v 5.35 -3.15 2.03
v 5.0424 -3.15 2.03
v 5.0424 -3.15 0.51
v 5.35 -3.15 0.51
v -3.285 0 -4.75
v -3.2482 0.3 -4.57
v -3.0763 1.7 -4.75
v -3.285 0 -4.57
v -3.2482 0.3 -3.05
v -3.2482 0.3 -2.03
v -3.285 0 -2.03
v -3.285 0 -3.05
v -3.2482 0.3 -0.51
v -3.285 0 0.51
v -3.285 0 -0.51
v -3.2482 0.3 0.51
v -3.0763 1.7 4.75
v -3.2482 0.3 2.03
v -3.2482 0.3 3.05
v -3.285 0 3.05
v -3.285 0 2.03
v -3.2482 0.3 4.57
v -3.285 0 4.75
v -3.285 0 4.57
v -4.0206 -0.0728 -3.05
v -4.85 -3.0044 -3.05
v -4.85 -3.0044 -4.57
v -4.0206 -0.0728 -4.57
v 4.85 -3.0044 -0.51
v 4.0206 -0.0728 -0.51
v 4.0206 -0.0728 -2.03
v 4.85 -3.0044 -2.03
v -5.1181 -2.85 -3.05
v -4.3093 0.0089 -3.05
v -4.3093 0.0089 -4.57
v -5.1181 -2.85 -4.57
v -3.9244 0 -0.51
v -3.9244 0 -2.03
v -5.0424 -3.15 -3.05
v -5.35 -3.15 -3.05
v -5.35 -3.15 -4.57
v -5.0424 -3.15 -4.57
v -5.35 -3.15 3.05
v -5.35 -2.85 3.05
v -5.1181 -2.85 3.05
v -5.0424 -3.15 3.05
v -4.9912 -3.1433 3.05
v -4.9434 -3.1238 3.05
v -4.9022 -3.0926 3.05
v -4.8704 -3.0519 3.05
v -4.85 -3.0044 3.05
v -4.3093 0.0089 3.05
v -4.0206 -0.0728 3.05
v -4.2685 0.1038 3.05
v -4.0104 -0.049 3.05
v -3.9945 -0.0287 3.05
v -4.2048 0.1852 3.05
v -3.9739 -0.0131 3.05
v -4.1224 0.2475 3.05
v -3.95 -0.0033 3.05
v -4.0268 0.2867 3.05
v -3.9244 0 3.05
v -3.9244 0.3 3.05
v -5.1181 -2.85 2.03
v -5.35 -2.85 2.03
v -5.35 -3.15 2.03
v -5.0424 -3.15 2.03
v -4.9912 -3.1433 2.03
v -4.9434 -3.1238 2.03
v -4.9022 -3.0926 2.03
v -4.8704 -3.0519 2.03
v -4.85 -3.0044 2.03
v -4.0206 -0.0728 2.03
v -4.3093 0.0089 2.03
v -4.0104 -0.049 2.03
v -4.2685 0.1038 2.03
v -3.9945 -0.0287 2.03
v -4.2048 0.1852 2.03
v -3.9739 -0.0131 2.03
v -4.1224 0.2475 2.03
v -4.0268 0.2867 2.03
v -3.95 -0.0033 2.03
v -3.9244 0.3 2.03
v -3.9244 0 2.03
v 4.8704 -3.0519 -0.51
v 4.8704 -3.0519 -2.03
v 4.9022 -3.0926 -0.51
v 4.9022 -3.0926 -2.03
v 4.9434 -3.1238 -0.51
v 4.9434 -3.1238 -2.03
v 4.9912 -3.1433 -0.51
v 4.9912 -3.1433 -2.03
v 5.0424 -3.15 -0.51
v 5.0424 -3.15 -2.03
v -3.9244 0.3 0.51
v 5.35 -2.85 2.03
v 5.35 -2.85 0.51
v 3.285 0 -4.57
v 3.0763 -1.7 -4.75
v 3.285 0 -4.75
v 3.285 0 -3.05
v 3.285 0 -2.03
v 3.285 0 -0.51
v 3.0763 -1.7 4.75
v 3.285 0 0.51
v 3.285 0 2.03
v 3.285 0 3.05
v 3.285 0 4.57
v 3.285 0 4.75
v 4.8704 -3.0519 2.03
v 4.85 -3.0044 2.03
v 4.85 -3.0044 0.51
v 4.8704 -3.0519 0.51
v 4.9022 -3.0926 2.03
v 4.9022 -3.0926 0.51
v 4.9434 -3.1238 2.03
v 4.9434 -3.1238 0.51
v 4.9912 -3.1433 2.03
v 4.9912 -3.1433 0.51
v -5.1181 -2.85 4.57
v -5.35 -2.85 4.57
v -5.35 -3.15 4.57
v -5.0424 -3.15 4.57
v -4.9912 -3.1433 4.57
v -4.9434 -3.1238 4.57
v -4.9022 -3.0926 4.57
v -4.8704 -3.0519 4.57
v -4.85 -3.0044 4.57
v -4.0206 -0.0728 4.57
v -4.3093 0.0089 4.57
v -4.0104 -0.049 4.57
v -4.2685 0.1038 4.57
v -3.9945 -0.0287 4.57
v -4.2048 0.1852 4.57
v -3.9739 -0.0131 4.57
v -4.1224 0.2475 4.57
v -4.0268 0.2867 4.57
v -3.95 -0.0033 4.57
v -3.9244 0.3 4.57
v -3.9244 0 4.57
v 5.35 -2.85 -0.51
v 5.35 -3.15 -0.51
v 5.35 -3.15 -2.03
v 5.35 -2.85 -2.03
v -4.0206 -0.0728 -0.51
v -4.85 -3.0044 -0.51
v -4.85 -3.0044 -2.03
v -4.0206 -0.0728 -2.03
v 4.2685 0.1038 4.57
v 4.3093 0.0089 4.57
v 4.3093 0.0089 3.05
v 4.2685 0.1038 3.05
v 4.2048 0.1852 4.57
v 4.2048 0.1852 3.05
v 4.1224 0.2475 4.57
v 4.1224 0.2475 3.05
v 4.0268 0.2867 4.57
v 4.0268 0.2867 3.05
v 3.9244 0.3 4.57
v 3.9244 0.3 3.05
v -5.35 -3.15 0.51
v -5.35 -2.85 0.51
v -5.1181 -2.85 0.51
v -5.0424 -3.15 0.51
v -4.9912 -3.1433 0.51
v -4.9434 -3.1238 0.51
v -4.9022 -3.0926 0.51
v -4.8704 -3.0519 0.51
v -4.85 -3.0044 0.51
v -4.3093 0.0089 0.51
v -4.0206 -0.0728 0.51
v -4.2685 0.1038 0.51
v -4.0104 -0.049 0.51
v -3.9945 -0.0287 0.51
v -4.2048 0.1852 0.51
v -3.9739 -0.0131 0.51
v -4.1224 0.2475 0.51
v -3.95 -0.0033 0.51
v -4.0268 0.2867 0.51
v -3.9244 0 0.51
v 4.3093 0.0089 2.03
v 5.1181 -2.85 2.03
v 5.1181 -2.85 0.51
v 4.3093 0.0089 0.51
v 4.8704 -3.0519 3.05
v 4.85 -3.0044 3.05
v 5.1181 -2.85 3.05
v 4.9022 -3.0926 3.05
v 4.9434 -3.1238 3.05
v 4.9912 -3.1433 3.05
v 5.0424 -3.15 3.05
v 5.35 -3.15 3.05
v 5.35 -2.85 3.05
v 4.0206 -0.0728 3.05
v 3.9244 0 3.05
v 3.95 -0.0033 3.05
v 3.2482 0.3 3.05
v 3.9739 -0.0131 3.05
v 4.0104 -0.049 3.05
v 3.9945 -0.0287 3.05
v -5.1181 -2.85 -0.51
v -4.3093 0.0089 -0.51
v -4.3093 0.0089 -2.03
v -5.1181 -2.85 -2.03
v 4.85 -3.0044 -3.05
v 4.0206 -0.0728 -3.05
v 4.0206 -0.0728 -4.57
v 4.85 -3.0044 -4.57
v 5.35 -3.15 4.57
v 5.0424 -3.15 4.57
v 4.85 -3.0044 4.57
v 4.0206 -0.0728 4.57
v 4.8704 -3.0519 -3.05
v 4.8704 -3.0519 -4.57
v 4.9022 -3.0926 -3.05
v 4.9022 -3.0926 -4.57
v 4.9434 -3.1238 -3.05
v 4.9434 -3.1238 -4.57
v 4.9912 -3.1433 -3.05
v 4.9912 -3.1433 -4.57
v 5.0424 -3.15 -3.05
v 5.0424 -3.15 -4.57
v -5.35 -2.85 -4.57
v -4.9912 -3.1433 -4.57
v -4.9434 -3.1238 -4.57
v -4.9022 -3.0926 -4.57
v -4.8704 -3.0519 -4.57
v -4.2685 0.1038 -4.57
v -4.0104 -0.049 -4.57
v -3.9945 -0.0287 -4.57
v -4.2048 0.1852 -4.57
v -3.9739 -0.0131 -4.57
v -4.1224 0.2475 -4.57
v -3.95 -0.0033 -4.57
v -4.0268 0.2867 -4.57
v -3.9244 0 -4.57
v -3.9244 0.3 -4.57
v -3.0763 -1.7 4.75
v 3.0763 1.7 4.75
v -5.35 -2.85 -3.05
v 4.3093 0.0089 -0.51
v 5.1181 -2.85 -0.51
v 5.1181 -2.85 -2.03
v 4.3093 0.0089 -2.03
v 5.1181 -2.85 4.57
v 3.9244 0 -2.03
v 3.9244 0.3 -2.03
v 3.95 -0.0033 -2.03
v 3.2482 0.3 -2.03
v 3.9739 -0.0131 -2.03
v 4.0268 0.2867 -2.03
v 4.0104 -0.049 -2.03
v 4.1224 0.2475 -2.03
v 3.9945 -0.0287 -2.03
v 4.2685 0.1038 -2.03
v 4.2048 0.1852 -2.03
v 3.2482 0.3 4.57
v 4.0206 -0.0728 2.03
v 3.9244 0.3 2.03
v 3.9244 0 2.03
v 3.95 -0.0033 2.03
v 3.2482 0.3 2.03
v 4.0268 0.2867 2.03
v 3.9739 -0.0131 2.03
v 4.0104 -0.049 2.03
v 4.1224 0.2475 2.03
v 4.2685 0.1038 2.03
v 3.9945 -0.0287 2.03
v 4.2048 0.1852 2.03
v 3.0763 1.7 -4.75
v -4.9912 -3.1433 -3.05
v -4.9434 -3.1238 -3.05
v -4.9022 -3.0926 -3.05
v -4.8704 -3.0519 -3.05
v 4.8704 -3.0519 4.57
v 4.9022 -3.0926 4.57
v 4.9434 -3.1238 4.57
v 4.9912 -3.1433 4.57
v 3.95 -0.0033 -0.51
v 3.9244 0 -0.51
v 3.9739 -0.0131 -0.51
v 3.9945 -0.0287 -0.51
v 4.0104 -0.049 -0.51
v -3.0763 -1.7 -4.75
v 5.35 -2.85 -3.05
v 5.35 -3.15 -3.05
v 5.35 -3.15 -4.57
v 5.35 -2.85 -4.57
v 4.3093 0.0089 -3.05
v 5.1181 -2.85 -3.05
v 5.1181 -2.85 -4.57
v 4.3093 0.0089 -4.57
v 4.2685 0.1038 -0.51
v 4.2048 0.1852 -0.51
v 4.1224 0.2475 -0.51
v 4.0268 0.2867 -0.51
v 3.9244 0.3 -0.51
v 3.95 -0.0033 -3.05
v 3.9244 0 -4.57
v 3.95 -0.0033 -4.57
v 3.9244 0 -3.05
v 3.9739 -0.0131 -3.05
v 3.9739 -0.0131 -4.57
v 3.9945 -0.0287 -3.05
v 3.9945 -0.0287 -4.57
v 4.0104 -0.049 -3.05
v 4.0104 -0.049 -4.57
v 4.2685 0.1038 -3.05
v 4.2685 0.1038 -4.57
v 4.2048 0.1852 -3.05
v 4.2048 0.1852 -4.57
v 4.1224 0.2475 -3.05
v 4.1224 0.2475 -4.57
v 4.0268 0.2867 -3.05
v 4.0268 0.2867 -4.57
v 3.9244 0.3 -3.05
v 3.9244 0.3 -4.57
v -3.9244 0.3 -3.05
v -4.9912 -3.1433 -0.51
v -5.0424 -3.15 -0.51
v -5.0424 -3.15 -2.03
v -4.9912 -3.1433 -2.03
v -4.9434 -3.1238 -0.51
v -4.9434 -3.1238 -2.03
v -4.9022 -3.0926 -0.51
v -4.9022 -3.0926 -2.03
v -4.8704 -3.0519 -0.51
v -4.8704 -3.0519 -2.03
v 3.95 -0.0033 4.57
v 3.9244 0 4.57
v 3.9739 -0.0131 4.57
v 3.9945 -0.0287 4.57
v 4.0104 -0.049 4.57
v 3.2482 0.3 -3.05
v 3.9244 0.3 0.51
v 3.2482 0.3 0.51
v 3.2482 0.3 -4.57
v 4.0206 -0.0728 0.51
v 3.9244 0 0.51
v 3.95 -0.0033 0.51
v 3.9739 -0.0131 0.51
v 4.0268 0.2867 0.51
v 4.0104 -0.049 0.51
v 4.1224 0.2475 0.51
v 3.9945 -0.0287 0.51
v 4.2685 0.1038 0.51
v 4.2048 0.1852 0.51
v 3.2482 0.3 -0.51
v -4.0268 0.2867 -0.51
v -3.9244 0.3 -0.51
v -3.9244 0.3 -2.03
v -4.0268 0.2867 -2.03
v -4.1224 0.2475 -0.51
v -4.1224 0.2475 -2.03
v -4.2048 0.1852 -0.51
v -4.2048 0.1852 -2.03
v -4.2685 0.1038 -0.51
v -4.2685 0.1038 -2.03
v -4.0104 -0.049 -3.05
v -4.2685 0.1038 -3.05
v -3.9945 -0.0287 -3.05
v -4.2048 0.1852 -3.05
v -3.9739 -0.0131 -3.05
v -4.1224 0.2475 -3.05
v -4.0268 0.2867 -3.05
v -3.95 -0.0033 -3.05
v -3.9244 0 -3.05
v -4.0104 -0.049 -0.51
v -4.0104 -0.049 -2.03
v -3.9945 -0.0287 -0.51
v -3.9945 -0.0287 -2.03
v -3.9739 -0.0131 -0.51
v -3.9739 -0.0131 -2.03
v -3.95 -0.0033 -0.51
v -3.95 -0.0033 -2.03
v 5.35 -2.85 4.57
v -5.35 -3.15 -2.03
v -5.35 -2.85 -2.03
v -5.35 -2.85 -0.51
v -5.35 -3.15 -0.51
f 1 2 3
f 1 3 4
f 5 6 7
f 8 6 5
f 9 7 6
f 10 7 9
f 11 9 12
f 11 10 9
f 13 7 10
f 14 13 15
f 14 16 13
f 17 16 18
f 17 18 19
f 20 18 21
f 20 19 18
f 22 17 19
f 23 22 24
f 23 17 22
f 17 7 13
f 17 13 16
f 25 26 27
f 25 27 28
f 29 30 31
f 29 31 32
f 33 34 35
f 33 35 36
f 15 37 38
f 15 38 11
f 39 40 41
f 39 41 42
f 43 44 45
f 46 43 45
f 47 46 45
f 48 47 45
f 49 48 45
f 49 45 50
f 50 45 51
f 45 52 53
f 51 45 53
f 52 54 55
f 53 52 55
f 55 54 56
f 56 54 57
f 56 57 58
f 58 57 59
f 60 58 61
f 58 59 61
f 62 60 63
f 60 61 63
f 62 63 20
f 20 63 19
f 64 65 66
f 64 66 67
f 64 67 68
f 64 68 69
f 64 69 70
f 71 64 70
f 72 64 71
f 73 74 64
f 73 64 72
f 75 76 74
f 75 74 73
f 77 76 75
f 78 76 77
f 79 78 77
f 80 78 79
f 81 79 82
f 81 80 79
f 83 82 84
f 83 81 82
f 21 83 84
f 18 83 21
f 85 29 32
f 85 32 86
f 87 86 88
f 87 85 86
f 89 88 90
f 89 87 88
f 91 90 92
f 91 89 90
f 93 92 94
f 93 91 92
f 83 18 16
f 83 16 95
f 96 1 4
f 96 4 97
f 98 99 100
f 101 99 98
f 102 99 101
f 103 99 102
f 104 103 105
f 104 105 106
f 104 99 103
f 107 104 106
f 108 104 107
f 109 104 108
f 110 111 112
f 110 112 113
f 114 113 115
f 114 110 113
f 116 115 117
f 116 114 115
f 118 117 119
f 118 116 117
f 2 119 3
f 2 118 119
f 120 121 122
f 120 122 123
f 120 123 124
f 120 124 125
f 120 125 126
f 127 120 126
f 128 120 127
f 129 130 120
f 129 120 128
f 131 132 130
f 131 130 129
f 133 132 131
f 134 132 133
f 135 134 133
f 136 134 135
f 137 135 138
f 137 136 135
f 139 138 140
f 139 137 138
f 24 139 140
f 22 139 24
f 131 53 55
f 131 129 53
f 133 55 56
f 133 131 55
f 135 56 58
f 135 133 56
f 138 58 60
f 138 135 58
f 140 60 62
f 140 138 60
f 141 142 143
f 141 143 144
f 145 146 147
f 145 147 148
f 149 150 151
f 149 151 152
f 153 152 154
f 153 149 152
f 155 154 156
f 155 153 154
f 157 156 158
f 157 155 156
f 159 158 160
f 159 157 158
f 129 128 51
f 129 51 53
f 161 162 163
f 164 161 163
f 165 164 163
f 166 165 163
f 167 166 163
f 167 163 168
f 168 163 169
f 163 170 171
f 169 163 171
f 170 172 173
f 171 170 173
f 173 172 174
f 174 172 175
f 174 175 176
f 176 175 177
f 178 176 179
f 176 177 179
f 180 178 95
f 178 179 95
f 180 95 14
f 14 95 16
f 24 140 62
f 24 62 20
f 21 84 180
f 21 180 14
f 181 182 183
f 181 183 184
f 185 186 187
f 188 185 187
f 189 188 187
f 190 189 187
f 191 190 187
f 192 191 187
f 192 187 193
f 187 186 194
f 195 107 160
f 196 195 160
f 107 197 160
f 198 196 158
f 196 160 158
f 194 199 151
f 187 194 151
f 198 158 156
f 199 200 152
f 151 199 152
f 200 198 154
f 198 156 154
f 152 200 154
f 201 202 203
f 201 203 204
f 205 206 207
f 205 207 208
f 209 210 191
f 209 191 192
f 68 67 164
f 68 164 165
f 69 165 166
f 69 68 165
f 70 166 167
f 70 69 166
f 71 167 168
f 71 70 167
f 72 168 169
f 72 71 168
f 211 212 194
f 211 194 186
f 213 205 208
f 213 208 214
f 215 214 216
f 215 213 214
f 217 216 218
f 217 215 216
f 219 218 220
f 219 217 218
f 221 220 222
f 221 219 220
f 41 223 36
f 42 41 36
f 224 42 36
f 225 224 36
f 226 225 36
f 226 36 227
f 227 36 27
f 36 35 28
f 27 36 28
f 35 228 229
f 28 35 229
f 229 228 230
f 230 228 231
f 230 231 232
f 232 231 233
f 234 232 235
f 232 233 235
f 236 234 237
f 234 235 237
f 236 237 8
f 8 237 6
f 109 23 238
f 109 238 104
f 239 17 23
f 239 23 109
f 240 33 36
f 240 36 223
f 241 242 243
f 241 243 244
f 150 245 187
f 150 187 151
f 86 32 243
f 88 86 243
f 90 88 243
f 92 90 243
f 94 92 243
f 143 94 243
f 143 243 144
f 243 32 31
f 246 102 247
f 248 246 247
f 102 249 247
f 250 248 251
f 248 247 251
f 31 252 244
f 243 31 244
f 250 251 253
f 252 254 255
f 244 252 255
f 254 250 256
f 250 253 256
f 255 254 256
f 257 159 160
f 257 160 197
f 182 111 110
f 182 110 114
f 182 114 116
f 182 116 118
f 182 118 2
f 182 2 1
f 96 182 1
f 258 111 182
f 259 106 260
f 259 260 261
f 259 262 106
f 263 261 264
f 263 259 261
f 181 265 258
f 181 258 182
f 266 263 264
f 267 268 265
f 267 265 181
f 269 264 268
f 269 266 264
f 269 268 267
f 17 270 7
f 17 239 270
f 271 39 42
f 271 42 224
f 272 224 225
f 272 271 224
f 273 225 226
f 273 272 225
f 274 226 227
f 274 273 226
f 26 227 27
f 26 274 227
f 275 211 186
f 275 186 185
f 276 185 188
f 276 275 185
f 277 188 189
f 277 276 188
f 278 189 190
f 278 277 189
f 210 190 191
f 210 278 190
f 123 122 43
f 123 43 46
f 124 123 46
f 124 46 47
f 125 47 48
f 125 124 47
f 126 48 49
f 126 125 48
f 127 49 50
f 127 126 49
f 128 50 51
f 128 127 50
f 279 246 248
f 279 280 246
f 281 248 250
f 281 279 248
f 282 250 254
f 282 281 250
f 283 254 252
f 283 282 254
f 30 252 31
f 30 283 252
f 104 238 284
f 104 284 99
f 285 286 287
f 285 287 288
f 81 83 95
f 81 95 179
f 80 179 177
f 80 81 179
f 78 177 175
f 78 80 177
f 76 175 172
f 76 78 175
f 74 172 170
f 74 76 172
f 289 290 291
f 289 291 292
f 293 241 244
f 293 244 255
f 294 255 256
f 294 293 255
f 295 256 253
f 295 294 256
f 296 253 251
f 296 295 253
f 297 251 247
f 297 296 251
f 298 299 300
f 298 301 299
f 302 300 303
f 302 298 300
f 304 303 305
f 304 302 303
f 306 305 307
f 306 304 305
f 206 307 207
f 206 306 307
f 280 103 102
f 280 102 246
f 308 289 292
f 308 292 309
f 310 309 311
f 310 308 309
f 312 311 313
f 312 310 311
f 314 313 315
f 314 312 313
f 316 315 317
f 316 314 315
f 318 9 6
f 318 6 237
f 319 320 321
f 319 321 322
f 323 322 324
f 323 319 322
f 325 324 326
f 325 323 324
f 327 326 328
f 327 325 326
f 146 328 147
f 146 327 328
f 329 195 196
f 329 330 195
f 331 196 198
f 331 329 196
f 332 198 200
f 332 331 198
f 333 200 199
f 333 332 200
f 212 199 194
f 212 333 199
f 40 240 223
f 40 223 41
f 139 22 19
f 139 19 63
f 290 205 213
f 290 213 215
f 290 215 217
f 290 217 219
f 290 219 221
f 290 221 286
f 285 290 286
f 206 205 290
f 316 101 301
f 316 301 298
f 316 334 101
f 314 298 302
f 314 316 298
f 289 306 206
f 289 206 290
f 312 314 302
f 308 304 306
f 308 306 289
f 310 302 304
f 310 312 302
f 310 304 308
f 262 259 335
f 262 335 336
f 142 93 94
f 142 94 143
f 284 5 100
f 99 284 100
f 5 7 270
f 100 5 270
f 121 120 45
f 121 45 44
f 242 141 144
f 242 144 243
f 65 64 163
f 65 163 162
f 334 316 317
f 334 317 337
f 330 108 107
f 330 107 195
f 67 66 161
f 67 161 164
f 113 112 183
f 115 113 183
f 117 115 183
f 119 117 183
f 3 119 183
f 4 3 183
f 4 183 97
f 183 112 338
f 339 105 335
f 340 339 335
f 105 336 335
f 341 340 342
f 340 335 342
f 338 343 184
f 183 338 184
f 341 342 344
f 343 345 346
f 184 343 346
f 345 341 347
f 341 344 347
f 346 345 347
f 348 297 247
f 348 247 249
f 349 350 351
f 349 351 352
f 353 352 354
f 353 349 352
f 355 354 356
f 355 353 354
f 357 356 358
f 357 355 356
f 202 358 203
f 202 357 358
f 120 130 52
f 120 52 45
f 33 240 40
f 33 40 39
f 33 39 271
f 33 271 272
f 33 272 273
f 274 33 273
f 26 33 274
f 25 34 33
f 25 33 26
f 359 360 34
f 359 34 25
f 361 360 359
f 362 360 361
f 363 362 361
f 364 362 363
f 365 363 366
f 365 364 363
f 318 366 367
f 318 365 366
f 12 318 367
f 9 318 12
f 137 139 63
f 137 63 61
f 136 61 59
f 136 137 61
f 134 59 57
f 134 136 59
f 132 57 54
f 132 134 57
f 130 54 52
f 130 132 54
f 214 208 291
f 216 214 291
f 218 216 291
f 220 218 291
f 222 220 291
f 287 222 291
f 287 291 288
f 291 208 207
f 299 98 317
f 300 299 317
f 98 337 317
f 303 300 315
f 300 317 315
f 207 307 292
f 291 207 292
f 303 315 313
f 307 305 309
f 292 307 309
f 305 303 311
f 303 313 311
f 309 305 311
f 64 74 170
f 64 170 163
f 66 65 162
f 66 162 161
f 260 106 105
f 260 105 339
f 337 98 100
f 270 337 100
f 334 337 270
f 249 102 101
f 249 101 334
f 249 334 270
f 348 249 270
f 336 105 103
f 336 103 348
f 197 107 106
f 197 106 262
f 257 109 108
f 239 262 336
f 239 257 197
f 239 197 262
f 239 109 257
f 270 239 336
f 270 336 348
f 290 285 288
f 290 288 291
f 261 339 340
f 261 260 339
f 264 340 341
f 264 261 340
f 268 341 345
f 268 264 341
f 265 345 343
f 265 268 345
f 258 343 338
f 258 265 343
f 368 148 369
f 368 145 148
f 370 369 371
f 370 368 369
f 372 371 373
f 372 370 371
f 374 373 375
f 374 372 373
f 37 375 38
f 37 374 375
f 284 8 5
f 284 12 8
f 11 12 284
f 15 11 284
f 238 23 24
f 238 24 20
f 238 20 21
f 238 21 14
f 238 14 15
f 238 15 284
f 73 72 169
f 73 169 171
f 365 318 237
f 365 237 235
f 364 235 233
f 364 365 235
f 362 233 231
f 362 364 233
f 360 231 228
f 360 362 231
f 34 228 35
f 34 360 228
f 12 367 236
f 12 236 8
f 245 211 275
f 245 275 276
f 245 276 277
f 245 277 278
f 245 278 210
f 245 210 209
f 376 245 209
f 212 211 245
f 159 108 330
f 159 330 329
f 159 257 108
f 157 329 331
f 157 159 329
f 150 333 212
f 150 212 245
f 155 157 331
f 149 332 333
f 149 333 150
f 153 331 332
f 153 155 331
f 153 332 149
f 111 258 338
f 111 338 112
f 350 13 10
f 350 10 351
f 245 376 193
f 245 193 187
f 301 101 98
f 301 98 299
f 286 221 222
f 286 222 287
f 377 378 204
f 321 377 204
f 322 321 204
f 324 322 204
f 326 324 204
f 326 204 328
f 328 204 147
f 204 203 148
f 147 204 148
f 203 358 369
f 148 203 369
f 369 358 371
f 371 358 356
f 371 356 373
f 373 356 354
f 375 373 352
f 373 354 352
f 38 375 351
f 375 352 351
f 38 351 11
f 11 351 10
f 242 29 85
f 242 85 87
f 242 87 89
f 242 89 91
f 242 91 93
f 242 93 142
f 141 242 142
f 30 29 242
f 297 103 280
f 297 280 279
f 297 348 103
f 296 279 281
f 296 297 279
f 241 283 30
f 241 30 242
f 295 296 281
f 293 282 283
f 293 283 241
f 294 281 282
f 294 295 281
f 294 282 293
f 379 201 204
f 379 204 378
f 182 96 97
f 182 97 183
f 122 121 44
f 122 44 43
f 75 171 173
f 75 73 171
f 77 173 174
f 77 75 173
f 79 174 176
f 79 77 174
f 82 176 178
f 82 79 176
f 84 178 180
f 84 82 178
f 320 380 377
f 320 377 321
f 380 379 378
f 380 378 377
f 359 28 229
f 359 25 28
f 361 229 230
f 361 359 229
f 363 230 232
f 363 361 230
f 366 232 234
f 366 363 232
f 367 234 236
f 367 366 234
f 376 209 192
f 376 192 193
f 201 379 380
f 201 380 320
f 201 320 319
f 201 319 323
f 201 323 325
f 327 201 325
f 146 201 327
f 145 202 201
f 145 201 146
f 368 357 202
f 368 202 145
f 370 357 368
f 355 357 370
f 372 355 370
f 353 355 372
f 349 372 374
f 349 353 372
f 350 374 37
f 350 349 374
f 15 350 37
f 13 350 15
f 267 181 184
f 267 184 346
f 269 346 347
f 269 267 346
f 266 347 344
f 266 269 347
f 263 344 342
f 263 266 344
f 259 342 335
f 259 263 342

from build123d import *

# Parameters (mm, degrees)
BOSS_EXTRUDE1_DEPTH  = 4.75
BOSS_EXTRUDE2_DEPTH  = 0.76
LPATTERN1_COUNT      = 3
LPATTERN1_PITCH      = 2.54
LPATTERN1_COUNT_DIR2 = 2
LPATTERN1_PITCH_DIR2 = 2.54


with BuildPart() as part:
    # Sketch1 → Boss-Extrude1 (new, symmetric)
    with BuildSketch(Plane.XY):
        Polygon((3.076266246, 1.7), (-3.076266246, 1.7), (-3.285, 0), (-3.076266246, -1.7), (3.076266246, -1.7), (3.285, 0), align=None)
    extrude(amount=BOSS_EXTRUDE1_DEPTH, both=True)

    # Sketch2 → Boss-Extrude2 (add, symmetric)
    with BuildSketch(Plane.XY.offset(1.27)):
        with BuildLine():
            Line((3.924366416, 0.3), (-3.924366416, 0.3))
            ThreePointArc((-3.924366416, 0.3), (-4.16565809, 0.219027159), (-4.309259402, 0.008891642))
            Line((-4.309259402, 0.008891642), (-5.118080076, -2.85))
            Line((-5.118080076, -2.85), (-5.35, -2.85))
            Line((-5.35, -2.85), (-5.35, -3.15))
            Line((-5.35, -3.15), (-5.042446493, -3.15))
            ThreePointArc((-5.042446493, -3.15), (-4.921800656, -3.10951358), (-4.85, -3.004445821))
            Line((-4.85, -3.004445821), (-4.020589663, -0.07277709))
            ThreePointArc((-4.020589663, -0.07277709), (-3.984689335, -0.02024321), (-3.924366416, 0))
            Line((-3.924366416, 0), (3.924366416, 0))
            ThreePointArc((3.924366416, 0), (3.984689335, -0.02024321), (4.020589663, -0.07277709))
            Line((4.020589663, -0.07277709), (4.85, -3.004445821))
            ThreePointArc((4.85, -3.004445821), (4.921800656, -3.10951358), (5.042446493, -3.15))
            Line((5.042446493, -3.15), (5.35, -3.15))
            Line((5.35, -3.15), (5.35, -2.85))
            Line((5.35, -2.85), (5.118080076, -2.85))
            Line((5.118080076, -2.85), (4.309259402, 0.008891642))
            ThreePointArc((4.309259402, 0.008891642), (4.16565809, 0.219027159), (3.924366416, 0.3))
        make_face()
    boss_extrude2 = extrude(amount=BOSS_EXTRUDE2_DEPTH, both=True)

    # LPattern1: Boss-Extrude2 3 × 2
    with Locations(*[Vector(0, 0, -1) * (i * LPATTERN1_PITCH) + Vector(0, 0, 1) * (j * LPATTERN1_PITCH_DIR2) for i in range(LPATTERN1_COUNT) for j in range(LPATTERN1_COUNT_DIR2) if (i, j) != (0, 0)]):
        add(boss_extrude2)


solid = part.part
